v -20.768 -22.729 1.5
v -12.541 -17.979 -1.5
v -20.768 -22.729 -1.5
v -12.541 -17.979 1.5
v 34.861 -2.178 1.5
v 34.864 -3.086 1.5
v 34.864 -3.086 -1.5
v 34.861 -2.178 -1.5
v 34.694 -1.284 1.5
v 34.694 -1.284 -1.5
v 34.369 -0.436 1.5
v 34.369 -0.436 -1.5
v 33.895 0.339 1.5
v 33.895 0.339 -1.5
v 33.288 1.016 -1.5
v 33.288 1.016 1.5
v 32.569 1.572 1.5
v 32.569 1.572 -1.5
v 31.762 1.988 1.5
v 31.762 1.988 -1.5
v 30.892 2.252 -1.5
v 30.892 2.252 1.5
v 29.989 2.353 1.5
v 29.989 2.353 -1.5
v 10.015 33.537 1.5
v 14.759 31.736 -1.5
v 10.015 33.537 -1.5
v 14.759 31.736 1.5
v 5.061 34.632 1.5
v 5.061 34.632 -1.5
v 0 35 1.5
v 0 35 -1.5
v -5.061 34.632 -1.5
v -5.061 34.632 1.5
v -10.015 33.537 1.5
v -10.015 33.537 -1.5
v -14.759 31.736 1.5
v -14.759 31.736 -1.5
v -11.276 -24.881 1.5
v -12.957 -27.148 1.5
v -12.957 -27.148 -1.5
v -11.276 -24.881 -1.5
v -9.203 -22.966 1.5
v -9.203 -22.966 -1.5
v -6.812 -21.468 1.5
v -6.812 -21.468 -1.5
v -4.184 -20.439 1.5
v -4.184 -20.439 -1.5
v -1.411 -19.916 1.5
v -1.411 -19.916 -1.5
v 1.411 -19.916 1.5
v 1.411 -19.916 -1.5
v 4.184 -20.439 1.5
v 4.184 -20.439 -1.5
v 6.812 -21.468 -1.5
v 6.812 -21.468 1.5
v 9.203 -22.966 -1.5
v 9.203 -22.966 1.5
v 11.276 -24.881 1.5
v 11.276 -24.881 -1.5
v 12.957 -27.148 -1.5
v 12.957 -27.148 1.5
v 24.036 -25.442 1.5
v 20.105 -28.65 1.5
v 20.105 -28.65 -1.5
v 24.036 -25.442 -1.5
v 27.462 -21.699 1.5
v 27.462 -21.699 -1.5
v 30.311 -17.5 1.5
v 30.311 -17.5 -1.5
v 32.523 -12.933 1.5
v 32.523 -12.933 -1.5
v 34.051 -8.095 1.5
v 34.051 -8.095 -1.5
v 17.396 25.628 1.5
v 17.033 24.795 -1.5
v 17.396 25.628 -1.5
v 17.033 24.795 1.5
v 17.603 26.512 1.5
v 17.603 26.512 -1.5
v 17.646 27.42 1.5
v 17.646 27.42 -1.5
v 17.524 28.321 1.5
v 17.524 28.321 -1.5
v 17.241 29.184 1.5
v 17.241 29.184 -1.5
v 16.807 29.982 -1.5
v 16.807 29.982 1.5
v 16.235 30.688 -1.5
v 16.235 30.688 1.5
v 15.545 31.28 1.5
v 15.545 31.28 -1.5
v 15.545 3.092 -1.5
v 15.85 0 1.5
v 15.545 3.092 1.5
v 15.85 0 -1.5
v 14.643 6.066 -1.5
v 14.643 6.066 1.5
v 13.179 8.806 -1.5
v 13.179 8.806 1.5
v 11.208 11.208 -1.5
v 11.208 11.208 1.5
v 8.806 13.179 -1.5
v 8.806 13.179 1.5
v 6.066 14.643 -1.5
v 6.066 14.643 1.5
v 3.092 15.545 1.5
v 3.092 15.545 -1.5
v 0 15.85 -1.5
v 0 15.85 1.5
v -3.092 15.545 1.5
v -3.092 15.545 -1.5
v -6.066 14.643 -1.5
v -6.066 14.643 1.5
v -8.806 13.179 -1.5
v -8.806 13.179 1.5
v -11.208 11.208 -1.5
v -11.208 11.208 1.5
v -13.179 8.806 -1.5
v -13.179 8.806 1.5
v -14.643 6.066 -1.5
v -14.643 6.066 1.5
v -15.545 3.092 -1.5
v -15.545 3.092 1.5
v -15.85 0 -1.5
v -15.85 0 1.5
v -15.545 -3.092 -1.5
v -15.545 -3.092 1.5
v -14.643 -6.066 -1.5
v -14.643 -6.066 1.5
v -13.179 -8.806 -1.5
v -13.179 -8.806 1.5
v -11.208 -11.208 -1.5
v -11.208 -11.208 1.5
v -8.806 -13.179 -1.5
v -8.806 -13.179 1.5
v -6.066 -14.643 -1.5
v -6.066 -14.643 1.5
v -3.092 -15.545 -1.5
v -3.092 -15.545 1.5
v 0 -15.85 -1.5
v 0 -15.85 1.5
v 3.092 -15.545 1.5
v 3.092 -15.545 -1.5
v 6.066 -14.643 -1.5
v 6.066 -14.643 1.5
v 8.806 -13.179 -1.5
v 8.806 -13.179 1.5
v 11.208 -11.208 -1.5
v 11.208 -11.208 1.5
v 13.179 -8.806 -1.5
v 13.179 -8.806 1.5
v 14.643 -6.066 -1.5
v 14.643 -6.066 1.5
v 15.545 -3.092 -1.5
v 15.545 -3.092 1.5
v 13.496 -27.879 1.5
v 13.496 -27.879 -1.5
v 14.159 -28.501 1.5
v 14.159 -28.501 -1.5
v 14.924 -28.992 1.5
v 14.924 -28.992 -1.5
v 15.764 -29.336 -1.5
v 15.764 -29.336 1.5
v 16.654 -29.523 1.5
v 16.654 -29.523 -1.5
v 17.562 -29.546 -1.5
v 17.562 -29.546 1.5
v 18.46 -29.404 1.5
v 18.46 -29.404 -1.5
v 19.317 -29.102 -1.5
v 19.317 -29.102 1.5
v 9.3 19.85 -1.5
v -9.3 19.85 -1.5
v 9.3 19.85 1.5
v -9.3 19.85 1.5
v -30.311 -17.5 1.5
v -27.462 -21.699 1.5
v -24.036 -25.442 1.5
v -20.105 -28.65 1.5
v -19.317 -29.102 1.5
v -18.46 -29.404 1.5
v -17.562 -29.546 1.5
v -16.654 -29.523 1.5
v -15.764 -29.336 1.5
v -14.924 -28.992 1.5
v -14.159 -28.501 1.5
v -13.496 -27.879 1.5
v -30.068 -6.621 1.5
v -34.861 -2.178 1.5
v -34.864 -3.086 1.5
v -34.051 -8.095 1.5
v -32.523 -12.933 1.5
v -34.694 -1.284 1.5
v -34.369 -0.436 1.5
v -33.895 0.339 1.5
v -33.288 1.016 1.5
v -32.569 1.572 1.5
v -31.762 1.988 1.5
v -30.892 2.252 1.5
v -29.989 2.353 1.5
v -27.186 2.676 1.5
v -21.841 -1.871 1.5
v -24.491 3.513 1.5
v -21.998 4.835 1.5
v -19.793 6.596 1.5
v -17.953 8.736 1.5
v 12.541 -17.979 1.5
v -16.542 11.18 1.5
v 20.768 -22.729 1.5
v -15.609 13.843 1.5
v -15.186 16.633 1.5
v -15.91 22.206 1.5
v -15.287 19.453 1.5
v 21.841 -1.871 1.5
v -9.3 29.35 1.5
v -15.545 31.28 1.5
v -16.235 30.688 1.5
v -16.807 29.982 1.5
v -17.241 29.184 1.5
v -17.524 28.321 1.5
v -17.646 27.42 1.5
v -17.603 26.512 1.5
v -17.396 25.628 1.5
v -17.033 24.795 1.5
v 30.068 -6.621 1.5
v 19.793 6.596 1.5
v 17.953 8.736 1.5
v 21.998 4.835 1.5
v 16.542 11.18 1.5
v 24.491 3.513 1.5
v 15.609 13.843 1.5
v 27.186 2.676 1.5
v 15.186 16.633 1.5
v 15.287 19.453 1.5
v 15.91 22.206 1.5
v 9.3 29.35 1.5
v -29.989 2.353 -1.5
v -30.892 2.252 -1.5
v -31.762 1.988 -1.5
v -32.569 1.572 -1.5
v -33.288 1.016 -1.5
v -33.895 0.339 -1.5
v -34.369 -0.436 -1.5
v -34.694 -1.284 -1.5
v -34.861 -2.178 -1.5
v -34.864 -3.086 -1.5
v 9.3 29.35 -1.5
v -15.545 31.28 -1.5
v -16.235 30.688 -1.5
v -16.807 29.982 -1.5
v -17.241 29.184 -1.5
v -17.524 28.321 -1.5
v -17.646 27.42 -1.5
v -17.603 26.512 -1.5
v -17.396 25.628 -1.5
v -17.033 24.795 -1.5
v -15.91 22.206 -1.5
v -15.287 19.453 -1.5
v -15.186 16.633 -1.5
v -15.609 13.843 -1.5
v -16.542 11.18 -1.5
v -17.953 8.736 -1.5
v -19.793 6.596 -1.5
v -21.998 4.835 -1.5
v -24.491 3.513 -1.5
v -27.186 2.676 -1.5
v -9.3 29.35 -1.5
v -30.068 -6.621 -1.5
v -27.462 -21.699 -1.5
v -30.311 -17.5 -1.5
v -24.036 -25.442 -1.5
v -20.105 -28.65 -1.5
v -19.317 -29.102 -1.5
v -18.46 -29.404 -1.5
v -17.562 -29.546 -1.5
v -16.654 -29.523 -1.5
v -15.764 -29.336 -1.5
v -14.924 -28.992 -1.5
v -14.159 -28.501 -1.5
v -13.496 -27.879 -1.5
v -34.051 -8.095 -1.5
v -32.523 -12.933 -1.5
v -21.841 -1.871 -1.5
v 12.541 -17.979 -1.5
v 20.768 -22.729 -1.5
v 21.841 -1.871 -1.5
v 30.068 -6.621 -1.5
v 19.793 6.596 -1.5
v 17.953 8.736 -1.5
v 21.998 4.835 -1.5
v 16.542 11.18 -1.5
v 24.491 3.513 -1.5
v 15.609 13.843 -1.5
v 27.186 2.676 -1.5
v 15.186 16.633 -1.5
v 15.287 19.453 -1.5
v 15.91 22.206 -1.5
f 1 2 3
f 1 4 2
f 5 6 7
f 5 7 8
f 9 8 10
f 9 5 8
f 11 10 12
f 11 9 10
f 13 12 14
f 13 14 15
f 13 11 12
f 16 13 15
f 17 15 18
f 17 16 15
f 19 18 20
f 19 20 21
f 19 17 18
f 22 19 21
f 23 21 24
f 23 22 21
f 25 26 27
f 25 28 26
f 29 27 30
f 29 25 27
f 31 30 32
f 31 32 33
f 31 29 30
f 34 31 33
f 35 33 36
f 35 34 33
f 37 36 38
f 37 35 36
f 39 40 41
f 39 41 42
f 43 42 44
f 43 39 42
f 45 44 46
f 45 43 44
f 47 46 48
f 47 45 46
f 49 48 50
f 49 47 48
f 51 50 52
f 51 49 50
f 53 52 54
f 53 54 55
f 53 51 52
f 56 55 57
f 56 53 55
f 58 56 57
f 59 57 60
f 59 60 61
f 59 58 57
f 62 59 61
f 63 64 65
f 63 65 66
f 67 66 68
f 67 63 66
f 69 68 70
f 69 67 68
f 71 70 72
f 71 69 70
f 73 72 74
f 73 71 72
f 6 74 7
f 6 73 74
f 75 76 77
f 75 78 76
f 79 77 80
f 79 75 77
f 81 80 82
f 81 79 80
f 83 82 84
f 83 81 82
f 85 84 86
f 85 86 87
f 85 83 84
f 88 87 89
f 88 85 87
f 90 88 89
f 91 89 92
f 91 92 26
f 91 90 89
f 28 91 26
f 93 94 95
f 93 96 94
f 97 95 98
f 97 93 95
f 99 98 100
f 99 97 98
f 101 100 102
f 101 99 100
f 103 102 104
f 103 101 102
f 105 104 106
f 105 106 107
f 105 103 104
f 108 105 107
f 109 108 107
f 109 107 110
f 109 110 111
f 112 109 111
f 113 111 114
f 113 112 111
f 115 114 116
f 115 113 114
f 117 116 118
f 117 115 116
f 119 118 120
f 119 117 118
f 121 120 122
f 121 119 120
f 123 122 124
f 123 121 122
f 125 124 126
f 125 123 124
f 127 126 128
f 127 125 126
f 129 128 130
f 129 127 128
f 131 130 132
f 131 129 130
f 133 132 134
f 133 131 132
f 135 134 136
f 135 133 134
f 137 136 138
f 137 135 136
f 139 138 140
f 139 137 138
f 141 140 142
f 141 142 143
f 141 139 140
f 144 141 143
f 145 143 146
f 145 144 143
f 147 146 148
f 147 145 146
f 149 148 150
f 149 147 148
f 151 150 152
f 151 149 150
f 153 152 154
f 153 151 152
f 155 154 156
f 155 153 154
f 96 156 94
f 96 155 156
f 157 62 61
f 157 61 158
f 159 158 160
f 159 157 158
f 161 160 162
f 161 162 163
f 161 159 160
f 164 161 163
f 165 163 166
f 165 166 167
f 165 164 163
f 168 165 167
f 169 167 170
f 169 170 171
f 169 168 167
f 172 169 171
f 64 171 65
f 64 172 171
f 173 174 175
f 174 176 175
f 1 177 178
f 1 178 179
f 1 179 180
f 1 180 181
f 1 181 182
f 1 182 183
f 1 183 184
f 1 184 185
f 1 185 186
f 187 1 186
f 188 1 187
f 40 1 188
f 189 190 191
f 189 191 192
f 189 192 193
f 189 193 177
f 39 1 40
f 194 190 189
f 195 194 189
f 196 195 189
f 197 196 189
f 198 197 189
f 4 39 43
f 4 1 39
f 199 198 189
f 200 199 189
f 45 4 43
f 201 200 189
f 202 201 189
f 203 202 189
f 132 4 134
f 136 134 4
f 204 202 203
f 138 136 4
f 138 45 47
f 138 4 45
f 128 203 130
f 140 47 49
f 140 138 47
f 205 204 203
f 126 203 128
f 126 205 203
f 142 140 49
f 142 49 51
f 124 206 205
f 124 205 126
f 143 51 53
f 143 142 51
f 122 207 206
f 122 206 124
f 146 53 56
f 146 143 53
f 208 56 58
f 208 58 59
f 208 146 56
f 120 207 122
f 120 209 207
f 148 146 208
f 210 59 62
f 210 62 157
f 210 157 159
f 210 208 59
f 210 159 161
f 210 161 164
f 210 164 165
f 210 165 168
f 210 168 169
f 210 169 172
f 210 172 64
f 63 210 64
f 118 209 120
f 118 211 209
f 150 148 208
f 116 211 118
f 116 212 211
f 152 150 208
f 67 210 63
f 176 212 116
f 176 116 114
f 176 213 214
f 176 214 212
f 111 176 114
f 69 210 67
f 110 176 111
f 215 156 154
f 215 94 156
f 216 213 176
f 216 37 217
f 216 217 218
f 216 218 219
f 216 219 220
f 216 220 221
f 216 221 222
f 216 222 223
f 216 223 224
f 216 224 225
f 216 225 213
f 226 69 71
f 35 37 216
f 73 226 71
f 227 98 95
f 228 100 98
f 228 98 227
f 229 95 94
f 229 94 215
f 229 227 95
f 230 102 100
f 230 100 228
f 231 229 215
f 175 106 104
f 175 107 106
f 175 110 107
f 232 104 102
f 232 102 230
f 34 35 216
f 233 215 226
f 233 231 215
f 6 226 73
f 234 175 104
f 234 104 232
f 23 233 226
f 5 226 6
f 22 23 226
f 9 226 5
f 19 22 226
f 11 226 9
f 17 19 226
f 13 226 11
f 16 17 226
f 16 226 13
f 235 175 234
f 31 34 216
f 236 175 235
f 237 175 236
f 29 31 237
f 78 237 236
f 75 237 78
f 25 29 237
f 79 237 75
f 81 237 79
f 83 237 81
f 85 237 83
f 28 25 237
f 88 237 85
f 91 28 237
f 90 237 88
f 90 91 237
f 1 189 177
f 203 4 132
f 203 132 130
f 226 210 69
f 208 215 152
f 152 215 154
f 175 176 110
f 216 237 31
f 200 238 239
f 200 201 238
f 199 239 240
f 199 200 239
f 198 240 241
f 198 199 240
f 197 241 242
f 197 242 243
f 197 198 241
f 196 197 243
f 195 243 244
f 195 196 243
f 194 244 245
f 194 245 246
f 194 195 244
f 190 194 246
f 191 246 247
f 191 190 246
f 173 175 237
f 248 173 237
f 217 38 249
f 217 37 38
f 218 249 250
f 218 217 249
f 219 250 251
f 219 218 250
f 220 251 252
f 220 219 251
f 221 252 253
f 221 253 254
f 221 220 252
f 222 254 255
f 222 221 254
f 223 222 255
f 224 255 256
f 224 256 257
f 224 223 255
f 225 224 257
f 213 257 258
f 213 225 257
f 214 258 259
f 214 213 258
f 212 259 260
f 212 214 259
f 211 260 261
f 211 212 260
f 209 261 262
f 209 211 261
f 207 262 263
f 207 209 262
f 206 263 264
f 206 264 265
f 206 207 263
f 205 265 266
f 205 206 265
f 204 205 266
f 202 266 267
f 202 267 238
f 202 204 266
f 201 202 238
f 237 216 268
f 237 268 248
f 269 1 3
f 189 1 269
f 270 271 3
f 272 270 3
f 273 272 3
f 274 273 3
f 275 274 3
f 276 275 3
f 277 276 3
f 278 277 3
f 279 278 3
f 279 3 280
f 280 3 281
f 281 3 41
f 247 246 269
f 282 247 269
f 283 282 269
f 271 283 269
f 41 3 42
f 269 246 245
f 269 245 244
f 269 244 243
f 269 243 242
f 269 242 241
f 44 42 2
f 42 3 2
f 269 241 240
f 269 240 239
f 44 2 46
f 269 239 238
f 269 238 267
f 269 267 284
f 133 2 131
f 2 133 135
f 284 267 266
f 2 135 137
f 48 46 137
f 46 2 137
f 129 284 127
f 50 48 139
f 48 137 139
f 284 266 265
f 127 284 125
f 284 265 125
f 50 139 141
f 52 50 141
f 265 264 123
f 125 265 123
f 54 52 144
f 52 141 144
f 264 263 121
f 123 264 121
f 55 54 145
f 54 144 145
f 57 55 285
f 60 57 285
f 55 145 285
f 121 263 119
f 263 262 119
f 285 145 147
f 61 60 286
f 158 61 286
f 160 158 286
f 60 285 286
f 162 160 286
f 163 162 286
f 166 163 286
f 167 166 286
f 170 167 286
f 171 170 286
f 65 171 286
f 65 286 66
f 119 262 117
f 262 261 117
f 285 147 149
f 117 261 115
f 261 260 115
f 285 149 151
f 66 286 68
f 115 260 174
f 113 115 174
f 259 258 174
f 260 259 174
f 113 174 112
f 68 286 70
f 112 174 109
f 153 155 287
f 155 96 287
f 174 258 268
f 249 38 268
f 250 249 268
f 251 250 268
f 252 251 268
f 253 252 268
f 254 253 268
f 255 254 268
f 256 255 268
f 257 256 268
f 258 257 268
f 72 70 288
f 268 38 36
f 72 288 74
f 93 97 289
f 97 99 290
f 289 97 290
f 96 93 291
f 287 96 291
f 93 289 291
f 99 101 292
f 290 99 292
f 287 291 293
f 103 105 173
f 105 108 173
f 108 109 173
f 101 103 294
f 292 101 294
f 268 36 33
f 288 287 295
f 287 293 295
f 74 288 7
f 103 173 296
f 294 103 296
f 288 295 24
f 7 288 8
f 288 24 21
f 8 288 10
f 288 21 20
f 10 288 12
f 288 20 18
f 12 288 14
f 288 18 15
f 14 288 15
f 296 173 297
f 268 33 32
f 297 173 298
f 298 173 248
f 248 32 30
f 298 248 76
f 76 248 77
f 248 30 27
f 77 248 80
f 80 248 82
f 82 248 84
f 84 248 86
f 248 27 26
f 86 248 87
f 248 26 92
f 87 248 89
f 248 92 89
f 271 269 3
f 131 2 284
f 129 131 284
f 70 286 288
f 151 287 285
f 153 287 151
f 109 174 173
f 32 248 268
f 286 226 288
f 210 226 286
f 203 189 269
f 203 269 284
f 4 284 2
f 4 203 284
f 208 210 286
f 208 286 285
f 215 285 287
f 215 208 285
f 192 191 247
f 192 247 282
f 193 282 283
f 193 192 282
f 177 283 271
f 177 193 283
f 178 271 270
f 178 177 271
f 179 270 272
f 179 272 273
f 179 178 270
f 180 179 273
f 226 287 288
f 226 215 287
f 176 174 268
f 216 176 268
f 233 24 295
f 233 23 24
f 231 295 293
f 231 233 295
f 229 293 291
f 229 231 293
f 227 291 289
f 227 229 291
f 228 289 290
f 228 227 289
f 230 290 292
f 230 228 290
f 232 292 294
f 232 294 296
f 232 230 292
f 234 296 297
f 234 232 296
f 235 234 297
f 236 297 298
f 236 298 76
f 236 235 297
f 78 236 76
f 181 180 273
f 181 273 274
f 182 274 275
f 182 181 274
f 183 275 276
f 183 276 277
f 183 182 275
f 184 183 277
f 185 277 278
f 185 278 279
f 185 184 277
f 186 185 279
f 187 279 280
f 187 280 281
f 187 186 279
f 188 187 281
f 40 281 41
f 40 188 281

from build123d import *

# Parameters (mm, degrees)
F0_R     = 15.85
F0_W     = 18.6
F0_H     = 9.5
F1_DEPTH = 1.5


with BuildPart() as f1:
    # F0 (on Top) → F1 (new body, symmetric)
    with BuildSketch(Plane.XY):
        with BuildLine():
            ThreePointArc((-29.989275, 2.353414), (-33.606886, 0.691253), (-34.863653, -3.086369))
            ThreePointArc((-34.863653, -3.086369), (-30.310889, -17.5), (-20.104701, -28.649625))
            ThreePointArc((-20.104701, -28.649625), (-16.2048, -29.450044), (-12.956521, -27.148181))
            ThreePointArc((-12.956521, -27.148181), (0, -19.85), (12.956521, -27.148181))
            ThreePointArc((12.956521, -27.148181), (16.2048, -29.450044), (20.104701, -28.649625))
            ThreePointArc((20.104701, -28.649625), (30.310889, -17.5), (34.863653, -3.086369))
            ThreePointArc((34.863653, -3.086369), (33.606886, 0.691253), (29.989275, 2.353414))
            ThreePointArc((29.989275, 2.353414), (17.190604, 9.925), (17.032754, 24.794767))
            ThreePointArc((17.032754, 24.794767), (17.402086, 28.758791), (14.758953, 31.735994))
            ThreePointArc((14.758953, 31.735994), (0, 35), (-14.758953, 31.735994))
            ThreePointArc((-14.758953, 31.735994), (-17.402086, 28.758791), (-17.032754, 24.794767))
            ThreePointArc((-17.032754, 24.794767), (-17.190604, 9.925), (-29.989275, 2.353414))
        make_face()
        Polygon((-20.767846, -22.729036), (-30.067846, -6.620964), (-21.840604, -1.870964), (-12.540604, -17.979036), align=None, mode=Mode.SUBTRACT)
        Circle(F0_R, mode=Mode.SUBTRACT)
        Polygon((30.067846, -6.620964), (20.767846, -22.729036), (12.540604, -17.979036), (21.840604, -1.870964), align=None, mode=Mode.SUBTRACT)
        with Locations((0, 24.6)):
            Rectangle(F0_W, F0_H, mode=Mode.SUBTRACT)
    extrude(amount=F1_DEPTH, both=True)


solid = f1.part
